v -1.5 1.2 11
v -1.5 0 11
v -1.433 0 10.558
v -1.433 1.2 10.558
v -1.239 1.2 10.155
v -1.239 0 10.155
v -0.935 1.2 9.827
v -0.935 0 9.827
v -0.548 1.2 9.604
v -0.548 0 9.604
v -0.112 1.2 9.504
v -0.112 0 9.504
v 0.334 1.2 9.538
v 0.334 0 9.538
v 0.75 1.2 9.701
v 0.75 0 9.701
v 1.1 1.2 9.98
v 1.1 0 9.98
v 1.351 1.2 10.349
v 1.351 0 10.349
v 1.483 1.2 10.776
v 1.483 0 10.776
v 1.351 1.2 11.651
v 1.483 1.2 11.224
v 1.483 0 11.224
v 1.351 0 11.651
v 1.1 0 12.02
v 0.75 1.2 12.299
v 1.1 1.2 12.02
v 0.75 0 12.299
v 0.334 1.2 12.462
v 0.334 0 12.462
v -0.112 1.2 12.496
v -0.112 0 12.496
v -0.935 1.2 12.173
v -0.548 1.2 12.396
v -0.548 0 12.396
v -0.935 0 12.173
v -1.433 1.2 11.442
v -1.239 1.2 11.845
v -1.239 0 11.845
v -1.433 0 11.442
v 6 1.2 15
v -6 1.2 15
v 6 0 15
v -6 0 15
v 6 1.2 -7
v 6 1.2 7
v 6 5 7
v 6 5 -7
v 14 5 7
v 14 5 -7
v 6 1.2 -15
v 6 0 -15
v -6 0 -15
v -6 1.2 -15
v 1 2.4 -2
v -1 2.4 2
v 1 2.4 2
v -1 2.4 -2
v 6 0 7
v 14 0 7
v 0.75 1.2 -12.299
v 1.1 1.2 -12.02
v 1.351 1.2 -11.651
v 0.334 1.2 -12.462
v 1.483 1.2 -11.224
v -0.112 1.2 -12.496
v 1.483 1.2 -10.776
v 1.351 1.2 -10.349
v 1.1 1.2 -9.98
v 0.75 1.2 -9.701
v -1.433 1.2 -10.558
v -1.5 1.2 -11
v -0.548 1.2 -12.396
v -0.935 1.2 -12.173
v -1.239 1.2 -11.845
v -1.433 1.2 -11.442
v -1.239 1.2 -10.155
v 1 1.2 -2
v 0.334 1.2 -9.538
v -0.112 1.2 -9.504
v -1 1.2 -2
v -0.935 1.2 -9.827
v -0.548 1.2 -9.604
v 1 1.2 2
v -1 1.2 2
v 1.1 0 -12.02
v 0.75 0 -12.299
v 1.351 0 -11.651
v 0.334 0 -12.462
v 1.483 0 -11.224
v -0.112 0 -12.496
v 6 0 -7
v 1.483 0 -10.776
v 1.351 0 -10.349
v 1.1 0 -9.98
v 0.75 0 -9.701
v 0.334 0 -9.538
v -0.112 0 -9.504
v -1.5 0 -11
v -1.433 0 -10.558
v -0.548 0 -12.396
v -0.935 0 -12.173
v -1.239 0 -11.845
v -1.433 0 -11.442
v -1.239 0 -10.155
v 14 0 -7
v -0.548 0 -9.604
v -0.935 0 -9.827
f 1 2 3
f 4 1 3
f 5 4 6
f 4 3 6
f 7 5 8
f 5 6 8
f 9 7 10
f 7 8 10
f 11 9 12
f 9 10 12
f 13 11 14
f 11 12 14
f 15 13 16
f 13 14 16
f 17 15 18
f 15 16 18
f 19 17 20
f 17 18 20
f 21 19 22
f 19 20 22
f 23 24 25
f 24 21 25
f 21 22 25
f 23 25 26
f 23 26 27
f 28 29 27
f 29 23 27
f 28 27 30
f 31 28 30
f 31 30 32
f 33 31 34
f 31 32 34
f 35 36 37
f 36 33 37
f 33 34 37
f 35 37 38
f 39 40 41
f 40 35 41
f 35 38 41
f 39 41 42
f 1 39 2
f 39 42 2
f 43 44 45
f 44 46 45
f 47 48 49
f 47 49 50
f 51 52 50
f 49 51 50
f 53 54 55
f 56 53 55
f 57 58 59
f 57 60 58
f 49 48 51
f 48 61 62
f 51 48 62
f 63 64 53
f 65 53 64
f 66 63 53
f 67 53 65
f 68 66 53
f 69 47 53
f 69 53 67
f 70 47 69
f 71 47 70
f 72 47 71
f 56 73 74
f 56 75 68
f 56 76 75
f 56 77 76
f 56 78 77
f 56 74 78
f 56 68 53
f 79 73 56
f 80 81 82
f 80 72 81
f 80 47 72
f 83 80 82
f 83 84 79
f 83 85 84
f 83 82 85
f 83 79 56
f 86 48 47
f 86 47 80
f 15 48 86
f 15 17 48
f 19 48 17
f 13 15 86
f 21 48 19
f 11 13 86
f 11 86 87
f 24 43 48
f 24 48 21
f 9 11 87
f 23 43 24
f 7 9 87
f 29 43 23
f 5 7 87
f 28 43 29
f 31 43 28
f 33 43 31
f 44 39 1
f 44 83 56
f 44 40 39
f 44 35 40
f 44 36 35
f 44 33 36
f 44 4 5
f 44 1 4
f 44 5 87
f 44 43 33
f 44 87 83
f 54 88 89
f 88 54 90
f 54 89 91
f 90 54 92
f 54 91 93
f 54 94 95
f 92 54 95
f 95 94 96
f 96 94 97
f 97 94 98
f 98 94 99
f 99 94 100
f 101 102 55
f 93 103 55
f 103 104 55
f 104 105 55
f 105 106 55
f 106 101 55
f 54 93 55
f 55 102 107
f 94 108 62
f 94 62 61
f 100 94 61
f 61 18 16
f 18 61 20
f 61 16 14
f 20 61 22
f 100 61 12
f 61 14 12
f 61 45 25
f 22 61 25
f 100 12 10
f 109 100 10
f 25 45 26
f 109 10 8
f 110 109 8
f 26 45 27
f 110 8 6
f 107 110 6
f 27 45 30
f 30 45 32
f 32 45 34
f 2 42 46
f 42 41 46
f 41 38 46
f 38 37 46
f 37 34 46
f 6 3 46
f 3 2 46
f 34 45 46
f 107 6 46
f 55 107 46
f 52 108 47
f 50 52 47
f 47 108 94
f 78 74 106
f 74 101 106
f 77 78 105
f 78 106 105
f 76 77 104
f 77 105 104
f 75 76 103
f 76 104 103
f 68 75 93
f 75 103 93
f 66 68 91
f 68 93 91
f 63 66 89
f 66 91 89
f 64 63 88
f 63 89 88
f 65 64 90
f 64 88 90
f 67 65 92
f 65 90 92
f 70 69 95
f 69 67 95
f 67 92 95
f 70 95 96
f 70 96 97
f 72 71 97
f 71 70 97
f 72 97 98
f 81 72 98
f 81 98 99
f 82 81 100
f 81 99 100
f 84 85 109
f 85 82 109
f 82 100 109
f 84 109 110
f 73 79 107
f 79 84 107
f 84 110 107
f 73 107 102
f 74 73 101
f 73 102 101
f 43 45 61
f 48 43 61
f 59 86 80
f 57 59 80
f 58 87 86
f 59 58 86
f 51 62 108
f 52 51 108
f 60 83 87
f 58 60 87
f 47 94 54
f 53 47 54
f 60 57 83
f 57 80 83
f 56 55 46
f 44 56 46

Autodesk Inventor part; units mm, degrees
ref_plane "YZ Plane" through (0, 0, 0) normal (1, 0, 0) x (0, 1, 0)
ref_plane "XZ Plane" through (0, 0, 0) normal (0, 1, 0) x (-1, 0, 0)
ref_plane "XY Plane" through (0, 0, 0) normal (0, 0, 1) x (1, 0, 0)
sketch "スケッチ1" plane through (0, 0, 0) normal (0, 1, 0) x (-1, 0, 0)
  line L0 (6, 15) -> (-6, 15)
  line L1 (-6, 15) -> (-6, -15)
  line L2 (-6, -15) -> (6, -15)
  line L3 (6, -15) -> (6, 15)
  line L4 (-6, 7) -> (-14, 7)
  line L5 (-14, 7) -> (-14, -7)
  line L6 (-14, -7) -> (-6, -7)
  line L7 (-6, -7) -> (-6, 7)
  circle A0 centre (0, 11) radius 1.5
  circle A1 centre (0, -11) radius 1.5
  point P0 (0, 0)
  dimension "d0" = 30
  dimension "d1" = 12
  dimension "d2" = 14
  dimension "d3" = 8
  dimension "d4" = 8
  dimension "d5" = 15
  dimension "d6" = 6
  dimension "d7" = 8
  dimension "d8" = 3
  dimension "d9" = 3
  dimension "d10" = 6
  dimension "d11" = 6
  dimension "d12" = 4
  dimension "d13" = 4
extrude "押し出し1" add sketch "スケッチ1" along normal blind 1.2 contours L3 L2 L1 L0
extrude "押し出し2" add sketch "スケッチ1" along normal blind 5 contours L1 L6 L5 L4
sketch "スケッチ2" plane through (0, 1.2, 0) normal (0, 1, 0) x (1, 0, 0)
  line L0 (-1, -2) -> (1, -2)
  line L1 (1, -2) -> (1, 2)
  line L2 (1, 2) -> (-1, 2)
  line L3 (-1, 2) -> (-1, -2)
  point P0 (0, 0)
  dimension "d18" = 2
  dimension "d19" = 4
  dimension "d20" = 2
  dimension "d21" = 1
extrude "押し出し3" add sketch "スケッチ2" along normal blind 1.2
properties part number "sensor"
